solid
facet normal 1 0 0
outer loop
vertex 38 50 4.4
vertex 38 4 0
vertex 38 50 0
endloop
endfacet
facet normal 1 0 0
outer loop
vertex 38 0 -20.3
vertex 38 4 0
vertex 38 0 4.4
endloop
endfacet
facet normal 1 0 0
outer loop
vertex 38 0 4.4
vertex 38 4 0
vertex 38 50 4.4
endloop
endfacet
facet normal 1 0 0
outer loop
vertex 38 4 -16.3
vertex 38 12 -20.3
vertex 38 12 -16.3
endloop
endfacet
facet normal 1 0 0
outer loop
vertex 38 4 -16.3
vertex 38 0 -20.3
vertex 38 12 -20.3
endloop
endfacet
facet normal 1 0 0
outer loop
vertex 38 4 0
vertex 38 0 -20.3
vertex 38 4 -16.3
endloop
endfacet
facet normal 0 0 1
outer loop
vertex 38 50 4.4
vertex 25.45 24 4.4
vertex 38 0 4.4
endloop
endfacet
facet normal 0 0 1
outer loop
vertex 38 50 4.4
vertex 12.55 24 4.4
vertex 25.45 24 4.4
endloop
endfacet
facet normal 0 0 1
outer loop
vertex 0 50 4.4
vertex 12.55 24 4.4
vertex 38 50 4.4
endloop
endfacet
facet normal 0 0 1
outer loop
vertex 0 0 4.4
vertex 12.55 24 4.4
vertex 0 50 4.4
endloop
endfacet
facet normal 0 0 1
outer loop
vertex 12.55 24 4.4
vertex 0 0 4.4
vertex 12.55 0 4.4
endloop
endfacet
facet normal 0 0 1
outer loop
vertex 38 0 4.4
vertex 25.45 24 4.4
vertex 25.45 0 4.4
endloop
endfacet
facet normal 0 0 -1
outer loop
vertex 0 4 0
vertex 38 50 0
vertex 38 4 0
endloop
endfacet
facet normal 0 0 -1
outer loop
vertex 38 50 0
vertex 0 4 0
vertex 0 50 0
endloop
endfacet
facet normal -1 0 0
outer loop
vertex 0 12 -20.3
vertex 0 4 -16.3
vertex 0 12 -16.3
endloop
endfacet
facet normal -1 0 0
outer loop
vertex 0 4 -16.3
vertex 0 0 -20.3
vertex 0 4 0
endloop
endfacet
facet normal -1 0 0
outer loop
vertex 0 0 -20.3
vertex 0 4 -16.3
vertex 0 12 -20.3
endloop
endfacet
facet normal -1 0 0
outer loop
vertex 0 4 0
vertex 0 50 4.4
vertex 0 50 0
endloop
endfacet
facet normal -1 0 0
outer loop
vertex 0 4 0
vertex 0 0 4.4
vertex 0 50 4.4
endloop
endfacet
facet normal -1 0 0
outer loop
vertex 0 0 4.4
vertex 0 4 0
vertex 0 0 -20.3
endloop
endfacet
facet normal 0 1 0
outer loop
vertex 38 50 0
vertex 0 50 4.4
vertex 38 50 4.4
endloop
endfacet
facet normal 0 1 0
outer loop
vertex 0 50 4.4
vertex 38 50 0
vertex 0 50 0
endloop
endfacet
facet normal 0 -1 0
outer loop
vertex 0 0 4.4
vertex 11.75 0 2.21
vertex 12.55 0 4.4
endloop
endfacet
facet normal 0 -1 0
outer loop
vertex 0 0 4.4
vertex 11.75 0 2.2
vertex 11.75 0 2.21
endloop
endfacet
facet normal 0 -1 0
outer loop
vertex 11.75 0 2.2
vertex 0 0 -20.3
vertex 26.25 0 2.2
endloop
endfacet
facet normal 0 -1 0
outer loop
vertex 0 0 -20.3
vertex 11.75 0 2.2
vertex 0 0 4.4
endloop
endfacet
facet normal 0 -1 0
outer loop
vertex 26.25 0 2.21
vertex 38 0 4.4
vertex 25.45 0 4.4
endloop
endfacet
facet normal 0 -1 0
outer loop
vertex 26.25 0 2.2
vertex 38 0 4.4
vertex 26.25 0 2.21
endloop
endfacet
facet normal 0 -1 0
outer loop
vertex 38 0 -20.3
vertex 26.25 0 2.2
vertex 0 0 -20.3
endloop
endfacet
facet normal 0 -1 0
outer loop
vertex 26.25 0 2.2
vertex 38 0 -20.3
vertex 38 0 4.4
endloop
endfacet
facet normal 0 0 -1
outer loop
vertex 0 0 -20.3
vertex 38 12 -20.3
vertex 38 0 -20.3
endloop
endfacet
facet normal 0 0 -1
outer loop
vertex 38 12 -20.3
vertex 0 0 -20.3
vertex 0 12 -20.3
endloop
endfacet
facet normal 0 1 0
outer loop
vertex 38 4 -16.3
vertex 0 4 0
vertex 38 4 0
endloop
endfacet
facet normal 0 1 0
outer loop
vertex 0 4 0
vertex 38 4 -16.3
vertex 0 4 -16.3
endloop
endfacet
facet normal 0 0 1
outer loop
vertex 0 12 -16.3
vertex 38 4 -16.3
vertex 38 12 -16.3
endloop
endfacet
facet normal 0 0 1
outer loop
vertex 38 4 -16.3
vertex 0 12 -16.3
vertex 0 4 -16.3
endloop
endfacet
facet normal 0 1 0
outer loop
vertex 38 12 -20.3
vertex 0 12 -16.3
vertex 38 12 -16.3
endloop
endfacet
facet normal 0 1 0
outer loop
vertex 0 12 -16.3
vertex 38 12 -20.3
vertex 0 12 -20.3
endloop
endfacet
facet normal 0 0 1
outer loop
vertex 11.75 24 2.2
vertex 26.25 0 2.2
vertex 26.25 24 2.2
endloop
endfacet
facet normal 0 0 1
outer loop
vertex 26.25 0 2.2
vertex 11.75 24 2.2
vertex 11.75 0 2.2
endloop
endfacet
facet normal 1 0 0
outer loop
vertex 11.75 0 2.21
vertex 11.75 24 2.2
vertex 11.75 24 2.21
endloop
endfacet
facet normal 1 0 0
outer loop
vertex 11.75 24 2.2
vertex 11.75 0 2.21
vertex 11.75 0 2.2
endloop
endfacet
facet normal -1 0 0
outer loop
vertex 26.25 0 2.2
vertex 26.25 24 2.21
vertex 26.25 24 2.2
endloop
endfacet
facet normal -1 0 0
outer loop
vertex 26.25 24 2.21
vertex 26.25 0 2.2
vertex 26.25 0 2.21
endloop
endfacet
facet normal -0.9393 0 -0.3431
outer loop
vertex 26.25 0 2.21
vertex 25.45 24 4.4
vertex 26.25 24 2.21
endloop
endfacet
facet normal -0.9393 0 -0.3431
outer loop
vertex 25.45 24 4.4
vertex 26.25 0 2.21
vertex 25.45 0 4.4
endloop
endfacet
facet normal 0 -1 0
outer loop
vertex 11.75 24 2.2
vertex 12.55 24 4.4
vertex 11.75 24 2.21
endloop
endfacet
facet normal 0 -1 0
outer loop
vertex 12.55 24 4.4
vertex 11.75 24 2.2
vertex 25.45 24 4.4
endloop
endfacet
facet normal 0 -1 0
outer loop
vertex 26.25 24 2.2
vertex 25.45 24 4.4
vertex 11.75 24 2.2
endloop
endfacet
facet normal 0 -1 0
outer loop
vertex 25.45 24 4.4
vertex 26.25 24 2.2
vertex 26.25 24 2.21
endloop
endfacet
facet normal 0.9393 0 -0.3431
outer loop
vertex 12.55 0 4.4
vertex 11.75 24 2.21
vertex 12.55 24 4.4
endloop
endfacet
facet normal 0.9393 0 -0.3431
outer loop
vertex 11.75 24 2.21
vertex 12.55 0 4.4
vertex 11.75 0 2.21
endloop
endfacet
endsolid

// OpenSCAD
// ============================================
// OpenGrid Under-Desk MacBook Air M2 Cradle v5
// Fixed: correct Multiconnect dovetail channel (hull method)
//        + stop walls on all channels
// U-shape: back_rail + two side_arm pieces
// Laptop drops in from above, lifts straight out.
//
// MOUNTING: OpenGrid Multiconnect dovetail system.
// Top face of each piece has dovetail channel(s).
// Snap (printed separately) slides in from open end.
// Stop wall prevents snap sliding through.
// Channel dims from official openGrid Thread Docs PDF:
//   slot (top, narrow) = 12.9mm
//   wide (bottom, undercut) = 14.5mm
//   depth = 2.2mm
//
// Print snaps: makerworld.com/en/models/1179191
// Repo: github.com/johntondreau-png/opengrid-desk-mounts
// ============================================

/* [Laptop Dimensions] */
// MacBook Air M2 width (mm)
laptop_w = 304.1;
// MacBook Air M2 depth (mm)
laptop_d = 215.0;
// MacBook Air M2 thickness (mm)
laptop_h = 11.3;

/* [Cradle Geometry] */
// Wall thickness (mm)
wall      = 4.0;
// Lip height above laptop top (mm)
lip       = 8;
// Side arm front-to-back depth (mm)
arm_depth = 50;
// Shelf depth under laptop edge (mm)
shelf     = 8;

/* [OpenGrid Snaps] */
// Grid spacing center-to-center (mm)
grid = 28;

/* [Part to Generate] */
// Which piece to print
part = "side_arm"; // [side_arm, back_rail]

/* [Hidden] */
gap      = 1.0;
arm_drop = laptop_h + gap + lip;

// Multiconnect dovetail channel dims (Thread Docs PDF)
// CORRECT: narrow slot at top, wider undercut below.
ch_slot  = 12.9;   // narrow opening at top surface (grid side)
ch_wide  = 14.5;   // wider undercut at bottom (locks snap)
ch_d     = 2.2;    // channel depth into part

// Snap body approximate length (travel distance in channel)
snap_len = 24.0;

// Flange must be thick enough: ch_d below + 2.2mm solid
flange_t = ch_d + 2.2;   // 4.4mm total

// Side arm flange width (one snap at grid pitch + margin)
side_fw  = grid + 10;    // 38mm

// Back rail flange depth (snap length + 4mm stop wall)
back_fd  = snap_len + 4; // 28mm

// Epsilon for hull geometry
eps = 0.01;

// ============================================
// mc_dovetail(len)
// Female Multiconnect dovetail channel cutter.
// Uses hull() of two thin slabs - unambiguous geometry.
//
// Call with origin at TOP CENTER of channel entry on
// the top face of the part (Z = flange_t in model).
// Channel runs from Y=0 to Y=len along +Y direction.
//
// At Z=0 (top surface, faces grid panel):
//   slot width = ch_slot = 12.9mm (narrow opening)
// At Z=-ch_d (deeper into part):
//   slot width = ch_wide = 14.5mm (wider undercut)
//
// The undercut locks the snap T-flange in place.
// Stop wall: leave solid material beyond Y=len.
// ============================================
module mc_dovetail(len) {
  hull() {
    // Narrow slab at top surface (Z=0): 12.9mm wide
    translate([-ch_slot/2, 0, -eps])
      cube([ch_slot, len, eps]);
    // Wide slab at bottom of channel (Z=-ch_d): 14.5mm wide
    translate([-ch_wide/2, 0, -ch_d])
      cube([ch_wide, len, eps]);
  }
}

// ============================================
// SIDE ARM
// Flange top face presses against OpenGrid panel.
// Channel: open at front face (Y=0), runs snap_len into arm.
// Stop wall = solid flange material from Y=snap_len to rear.
// L-bracket below: vertical wall + shelf cradles laptop edge.
// Print 2 copies (symmetric, works for left and right).
// ============================================
module side_arm() {
  difference() {
    union() {
      // Top flange (presses against grid panel)
      cube([side_fw, arm_depth, flange_t]);
      // Vertical wall below (laptop side edge stop)
      translate([0, 0, -arm_drop])
        cube([side_fw, wall, arm_drop]);
      // Horizontal shelf (laptop edge rests on this)
      translate([0, wall, -arm_drop])
        cube([side_fw, shelf, wall]);
    }
    // Dovetail channel: centered in X, open at Y=0
    // Runs snap_len in Y; rest of arm_depth = stop wall
    translate([side_fw/2, 0, flange_t])
      mc_dovetail(snap_len);
  }
}

// ============================================
// BACK RAIL
// Spans full laptop width as rear backstop.
// Flange depth = back_fd (28mm) to fit snap length.
// Multiple channels at 28mm grid pitch, open at front.
// Vertical wall at rear is laptop back edge stop.
// Rail is ~312mm long; orient diagonally on P2S bed.
// ============================================
module back_rail() {
  rail_w = laptop_w + wall * 2;   // ~312mm
  n = floor(rail_w / grid);       // number of snap channels

  difference() {
    union() {
      // Top flange (back_fd deep to accommodate full snap)
      cube([rail_w, back_fd, flange_t]);
      // Vertical backstop wall below, at rear of flange
      translate([0, back_fd, -arm_drop])
        cube([rail_w, wall, arm_drop + flange_t]);
    }
    // Channels at each grid position, open at Y=0
    for (i = [0 : n - 1]) {
      cx = (rail_w / 2) - ((n - 1) * grid / 2) + i * grid;
      translate([cx, 0, flange_t])
        mc_dovetail(snap_len);
    }
  }
}

// ============================================
// RENDER
// ============================================
if (part == "side_arm") {
  side_arm();
} else if (part == "back_rail") {
  back_rail();
}
